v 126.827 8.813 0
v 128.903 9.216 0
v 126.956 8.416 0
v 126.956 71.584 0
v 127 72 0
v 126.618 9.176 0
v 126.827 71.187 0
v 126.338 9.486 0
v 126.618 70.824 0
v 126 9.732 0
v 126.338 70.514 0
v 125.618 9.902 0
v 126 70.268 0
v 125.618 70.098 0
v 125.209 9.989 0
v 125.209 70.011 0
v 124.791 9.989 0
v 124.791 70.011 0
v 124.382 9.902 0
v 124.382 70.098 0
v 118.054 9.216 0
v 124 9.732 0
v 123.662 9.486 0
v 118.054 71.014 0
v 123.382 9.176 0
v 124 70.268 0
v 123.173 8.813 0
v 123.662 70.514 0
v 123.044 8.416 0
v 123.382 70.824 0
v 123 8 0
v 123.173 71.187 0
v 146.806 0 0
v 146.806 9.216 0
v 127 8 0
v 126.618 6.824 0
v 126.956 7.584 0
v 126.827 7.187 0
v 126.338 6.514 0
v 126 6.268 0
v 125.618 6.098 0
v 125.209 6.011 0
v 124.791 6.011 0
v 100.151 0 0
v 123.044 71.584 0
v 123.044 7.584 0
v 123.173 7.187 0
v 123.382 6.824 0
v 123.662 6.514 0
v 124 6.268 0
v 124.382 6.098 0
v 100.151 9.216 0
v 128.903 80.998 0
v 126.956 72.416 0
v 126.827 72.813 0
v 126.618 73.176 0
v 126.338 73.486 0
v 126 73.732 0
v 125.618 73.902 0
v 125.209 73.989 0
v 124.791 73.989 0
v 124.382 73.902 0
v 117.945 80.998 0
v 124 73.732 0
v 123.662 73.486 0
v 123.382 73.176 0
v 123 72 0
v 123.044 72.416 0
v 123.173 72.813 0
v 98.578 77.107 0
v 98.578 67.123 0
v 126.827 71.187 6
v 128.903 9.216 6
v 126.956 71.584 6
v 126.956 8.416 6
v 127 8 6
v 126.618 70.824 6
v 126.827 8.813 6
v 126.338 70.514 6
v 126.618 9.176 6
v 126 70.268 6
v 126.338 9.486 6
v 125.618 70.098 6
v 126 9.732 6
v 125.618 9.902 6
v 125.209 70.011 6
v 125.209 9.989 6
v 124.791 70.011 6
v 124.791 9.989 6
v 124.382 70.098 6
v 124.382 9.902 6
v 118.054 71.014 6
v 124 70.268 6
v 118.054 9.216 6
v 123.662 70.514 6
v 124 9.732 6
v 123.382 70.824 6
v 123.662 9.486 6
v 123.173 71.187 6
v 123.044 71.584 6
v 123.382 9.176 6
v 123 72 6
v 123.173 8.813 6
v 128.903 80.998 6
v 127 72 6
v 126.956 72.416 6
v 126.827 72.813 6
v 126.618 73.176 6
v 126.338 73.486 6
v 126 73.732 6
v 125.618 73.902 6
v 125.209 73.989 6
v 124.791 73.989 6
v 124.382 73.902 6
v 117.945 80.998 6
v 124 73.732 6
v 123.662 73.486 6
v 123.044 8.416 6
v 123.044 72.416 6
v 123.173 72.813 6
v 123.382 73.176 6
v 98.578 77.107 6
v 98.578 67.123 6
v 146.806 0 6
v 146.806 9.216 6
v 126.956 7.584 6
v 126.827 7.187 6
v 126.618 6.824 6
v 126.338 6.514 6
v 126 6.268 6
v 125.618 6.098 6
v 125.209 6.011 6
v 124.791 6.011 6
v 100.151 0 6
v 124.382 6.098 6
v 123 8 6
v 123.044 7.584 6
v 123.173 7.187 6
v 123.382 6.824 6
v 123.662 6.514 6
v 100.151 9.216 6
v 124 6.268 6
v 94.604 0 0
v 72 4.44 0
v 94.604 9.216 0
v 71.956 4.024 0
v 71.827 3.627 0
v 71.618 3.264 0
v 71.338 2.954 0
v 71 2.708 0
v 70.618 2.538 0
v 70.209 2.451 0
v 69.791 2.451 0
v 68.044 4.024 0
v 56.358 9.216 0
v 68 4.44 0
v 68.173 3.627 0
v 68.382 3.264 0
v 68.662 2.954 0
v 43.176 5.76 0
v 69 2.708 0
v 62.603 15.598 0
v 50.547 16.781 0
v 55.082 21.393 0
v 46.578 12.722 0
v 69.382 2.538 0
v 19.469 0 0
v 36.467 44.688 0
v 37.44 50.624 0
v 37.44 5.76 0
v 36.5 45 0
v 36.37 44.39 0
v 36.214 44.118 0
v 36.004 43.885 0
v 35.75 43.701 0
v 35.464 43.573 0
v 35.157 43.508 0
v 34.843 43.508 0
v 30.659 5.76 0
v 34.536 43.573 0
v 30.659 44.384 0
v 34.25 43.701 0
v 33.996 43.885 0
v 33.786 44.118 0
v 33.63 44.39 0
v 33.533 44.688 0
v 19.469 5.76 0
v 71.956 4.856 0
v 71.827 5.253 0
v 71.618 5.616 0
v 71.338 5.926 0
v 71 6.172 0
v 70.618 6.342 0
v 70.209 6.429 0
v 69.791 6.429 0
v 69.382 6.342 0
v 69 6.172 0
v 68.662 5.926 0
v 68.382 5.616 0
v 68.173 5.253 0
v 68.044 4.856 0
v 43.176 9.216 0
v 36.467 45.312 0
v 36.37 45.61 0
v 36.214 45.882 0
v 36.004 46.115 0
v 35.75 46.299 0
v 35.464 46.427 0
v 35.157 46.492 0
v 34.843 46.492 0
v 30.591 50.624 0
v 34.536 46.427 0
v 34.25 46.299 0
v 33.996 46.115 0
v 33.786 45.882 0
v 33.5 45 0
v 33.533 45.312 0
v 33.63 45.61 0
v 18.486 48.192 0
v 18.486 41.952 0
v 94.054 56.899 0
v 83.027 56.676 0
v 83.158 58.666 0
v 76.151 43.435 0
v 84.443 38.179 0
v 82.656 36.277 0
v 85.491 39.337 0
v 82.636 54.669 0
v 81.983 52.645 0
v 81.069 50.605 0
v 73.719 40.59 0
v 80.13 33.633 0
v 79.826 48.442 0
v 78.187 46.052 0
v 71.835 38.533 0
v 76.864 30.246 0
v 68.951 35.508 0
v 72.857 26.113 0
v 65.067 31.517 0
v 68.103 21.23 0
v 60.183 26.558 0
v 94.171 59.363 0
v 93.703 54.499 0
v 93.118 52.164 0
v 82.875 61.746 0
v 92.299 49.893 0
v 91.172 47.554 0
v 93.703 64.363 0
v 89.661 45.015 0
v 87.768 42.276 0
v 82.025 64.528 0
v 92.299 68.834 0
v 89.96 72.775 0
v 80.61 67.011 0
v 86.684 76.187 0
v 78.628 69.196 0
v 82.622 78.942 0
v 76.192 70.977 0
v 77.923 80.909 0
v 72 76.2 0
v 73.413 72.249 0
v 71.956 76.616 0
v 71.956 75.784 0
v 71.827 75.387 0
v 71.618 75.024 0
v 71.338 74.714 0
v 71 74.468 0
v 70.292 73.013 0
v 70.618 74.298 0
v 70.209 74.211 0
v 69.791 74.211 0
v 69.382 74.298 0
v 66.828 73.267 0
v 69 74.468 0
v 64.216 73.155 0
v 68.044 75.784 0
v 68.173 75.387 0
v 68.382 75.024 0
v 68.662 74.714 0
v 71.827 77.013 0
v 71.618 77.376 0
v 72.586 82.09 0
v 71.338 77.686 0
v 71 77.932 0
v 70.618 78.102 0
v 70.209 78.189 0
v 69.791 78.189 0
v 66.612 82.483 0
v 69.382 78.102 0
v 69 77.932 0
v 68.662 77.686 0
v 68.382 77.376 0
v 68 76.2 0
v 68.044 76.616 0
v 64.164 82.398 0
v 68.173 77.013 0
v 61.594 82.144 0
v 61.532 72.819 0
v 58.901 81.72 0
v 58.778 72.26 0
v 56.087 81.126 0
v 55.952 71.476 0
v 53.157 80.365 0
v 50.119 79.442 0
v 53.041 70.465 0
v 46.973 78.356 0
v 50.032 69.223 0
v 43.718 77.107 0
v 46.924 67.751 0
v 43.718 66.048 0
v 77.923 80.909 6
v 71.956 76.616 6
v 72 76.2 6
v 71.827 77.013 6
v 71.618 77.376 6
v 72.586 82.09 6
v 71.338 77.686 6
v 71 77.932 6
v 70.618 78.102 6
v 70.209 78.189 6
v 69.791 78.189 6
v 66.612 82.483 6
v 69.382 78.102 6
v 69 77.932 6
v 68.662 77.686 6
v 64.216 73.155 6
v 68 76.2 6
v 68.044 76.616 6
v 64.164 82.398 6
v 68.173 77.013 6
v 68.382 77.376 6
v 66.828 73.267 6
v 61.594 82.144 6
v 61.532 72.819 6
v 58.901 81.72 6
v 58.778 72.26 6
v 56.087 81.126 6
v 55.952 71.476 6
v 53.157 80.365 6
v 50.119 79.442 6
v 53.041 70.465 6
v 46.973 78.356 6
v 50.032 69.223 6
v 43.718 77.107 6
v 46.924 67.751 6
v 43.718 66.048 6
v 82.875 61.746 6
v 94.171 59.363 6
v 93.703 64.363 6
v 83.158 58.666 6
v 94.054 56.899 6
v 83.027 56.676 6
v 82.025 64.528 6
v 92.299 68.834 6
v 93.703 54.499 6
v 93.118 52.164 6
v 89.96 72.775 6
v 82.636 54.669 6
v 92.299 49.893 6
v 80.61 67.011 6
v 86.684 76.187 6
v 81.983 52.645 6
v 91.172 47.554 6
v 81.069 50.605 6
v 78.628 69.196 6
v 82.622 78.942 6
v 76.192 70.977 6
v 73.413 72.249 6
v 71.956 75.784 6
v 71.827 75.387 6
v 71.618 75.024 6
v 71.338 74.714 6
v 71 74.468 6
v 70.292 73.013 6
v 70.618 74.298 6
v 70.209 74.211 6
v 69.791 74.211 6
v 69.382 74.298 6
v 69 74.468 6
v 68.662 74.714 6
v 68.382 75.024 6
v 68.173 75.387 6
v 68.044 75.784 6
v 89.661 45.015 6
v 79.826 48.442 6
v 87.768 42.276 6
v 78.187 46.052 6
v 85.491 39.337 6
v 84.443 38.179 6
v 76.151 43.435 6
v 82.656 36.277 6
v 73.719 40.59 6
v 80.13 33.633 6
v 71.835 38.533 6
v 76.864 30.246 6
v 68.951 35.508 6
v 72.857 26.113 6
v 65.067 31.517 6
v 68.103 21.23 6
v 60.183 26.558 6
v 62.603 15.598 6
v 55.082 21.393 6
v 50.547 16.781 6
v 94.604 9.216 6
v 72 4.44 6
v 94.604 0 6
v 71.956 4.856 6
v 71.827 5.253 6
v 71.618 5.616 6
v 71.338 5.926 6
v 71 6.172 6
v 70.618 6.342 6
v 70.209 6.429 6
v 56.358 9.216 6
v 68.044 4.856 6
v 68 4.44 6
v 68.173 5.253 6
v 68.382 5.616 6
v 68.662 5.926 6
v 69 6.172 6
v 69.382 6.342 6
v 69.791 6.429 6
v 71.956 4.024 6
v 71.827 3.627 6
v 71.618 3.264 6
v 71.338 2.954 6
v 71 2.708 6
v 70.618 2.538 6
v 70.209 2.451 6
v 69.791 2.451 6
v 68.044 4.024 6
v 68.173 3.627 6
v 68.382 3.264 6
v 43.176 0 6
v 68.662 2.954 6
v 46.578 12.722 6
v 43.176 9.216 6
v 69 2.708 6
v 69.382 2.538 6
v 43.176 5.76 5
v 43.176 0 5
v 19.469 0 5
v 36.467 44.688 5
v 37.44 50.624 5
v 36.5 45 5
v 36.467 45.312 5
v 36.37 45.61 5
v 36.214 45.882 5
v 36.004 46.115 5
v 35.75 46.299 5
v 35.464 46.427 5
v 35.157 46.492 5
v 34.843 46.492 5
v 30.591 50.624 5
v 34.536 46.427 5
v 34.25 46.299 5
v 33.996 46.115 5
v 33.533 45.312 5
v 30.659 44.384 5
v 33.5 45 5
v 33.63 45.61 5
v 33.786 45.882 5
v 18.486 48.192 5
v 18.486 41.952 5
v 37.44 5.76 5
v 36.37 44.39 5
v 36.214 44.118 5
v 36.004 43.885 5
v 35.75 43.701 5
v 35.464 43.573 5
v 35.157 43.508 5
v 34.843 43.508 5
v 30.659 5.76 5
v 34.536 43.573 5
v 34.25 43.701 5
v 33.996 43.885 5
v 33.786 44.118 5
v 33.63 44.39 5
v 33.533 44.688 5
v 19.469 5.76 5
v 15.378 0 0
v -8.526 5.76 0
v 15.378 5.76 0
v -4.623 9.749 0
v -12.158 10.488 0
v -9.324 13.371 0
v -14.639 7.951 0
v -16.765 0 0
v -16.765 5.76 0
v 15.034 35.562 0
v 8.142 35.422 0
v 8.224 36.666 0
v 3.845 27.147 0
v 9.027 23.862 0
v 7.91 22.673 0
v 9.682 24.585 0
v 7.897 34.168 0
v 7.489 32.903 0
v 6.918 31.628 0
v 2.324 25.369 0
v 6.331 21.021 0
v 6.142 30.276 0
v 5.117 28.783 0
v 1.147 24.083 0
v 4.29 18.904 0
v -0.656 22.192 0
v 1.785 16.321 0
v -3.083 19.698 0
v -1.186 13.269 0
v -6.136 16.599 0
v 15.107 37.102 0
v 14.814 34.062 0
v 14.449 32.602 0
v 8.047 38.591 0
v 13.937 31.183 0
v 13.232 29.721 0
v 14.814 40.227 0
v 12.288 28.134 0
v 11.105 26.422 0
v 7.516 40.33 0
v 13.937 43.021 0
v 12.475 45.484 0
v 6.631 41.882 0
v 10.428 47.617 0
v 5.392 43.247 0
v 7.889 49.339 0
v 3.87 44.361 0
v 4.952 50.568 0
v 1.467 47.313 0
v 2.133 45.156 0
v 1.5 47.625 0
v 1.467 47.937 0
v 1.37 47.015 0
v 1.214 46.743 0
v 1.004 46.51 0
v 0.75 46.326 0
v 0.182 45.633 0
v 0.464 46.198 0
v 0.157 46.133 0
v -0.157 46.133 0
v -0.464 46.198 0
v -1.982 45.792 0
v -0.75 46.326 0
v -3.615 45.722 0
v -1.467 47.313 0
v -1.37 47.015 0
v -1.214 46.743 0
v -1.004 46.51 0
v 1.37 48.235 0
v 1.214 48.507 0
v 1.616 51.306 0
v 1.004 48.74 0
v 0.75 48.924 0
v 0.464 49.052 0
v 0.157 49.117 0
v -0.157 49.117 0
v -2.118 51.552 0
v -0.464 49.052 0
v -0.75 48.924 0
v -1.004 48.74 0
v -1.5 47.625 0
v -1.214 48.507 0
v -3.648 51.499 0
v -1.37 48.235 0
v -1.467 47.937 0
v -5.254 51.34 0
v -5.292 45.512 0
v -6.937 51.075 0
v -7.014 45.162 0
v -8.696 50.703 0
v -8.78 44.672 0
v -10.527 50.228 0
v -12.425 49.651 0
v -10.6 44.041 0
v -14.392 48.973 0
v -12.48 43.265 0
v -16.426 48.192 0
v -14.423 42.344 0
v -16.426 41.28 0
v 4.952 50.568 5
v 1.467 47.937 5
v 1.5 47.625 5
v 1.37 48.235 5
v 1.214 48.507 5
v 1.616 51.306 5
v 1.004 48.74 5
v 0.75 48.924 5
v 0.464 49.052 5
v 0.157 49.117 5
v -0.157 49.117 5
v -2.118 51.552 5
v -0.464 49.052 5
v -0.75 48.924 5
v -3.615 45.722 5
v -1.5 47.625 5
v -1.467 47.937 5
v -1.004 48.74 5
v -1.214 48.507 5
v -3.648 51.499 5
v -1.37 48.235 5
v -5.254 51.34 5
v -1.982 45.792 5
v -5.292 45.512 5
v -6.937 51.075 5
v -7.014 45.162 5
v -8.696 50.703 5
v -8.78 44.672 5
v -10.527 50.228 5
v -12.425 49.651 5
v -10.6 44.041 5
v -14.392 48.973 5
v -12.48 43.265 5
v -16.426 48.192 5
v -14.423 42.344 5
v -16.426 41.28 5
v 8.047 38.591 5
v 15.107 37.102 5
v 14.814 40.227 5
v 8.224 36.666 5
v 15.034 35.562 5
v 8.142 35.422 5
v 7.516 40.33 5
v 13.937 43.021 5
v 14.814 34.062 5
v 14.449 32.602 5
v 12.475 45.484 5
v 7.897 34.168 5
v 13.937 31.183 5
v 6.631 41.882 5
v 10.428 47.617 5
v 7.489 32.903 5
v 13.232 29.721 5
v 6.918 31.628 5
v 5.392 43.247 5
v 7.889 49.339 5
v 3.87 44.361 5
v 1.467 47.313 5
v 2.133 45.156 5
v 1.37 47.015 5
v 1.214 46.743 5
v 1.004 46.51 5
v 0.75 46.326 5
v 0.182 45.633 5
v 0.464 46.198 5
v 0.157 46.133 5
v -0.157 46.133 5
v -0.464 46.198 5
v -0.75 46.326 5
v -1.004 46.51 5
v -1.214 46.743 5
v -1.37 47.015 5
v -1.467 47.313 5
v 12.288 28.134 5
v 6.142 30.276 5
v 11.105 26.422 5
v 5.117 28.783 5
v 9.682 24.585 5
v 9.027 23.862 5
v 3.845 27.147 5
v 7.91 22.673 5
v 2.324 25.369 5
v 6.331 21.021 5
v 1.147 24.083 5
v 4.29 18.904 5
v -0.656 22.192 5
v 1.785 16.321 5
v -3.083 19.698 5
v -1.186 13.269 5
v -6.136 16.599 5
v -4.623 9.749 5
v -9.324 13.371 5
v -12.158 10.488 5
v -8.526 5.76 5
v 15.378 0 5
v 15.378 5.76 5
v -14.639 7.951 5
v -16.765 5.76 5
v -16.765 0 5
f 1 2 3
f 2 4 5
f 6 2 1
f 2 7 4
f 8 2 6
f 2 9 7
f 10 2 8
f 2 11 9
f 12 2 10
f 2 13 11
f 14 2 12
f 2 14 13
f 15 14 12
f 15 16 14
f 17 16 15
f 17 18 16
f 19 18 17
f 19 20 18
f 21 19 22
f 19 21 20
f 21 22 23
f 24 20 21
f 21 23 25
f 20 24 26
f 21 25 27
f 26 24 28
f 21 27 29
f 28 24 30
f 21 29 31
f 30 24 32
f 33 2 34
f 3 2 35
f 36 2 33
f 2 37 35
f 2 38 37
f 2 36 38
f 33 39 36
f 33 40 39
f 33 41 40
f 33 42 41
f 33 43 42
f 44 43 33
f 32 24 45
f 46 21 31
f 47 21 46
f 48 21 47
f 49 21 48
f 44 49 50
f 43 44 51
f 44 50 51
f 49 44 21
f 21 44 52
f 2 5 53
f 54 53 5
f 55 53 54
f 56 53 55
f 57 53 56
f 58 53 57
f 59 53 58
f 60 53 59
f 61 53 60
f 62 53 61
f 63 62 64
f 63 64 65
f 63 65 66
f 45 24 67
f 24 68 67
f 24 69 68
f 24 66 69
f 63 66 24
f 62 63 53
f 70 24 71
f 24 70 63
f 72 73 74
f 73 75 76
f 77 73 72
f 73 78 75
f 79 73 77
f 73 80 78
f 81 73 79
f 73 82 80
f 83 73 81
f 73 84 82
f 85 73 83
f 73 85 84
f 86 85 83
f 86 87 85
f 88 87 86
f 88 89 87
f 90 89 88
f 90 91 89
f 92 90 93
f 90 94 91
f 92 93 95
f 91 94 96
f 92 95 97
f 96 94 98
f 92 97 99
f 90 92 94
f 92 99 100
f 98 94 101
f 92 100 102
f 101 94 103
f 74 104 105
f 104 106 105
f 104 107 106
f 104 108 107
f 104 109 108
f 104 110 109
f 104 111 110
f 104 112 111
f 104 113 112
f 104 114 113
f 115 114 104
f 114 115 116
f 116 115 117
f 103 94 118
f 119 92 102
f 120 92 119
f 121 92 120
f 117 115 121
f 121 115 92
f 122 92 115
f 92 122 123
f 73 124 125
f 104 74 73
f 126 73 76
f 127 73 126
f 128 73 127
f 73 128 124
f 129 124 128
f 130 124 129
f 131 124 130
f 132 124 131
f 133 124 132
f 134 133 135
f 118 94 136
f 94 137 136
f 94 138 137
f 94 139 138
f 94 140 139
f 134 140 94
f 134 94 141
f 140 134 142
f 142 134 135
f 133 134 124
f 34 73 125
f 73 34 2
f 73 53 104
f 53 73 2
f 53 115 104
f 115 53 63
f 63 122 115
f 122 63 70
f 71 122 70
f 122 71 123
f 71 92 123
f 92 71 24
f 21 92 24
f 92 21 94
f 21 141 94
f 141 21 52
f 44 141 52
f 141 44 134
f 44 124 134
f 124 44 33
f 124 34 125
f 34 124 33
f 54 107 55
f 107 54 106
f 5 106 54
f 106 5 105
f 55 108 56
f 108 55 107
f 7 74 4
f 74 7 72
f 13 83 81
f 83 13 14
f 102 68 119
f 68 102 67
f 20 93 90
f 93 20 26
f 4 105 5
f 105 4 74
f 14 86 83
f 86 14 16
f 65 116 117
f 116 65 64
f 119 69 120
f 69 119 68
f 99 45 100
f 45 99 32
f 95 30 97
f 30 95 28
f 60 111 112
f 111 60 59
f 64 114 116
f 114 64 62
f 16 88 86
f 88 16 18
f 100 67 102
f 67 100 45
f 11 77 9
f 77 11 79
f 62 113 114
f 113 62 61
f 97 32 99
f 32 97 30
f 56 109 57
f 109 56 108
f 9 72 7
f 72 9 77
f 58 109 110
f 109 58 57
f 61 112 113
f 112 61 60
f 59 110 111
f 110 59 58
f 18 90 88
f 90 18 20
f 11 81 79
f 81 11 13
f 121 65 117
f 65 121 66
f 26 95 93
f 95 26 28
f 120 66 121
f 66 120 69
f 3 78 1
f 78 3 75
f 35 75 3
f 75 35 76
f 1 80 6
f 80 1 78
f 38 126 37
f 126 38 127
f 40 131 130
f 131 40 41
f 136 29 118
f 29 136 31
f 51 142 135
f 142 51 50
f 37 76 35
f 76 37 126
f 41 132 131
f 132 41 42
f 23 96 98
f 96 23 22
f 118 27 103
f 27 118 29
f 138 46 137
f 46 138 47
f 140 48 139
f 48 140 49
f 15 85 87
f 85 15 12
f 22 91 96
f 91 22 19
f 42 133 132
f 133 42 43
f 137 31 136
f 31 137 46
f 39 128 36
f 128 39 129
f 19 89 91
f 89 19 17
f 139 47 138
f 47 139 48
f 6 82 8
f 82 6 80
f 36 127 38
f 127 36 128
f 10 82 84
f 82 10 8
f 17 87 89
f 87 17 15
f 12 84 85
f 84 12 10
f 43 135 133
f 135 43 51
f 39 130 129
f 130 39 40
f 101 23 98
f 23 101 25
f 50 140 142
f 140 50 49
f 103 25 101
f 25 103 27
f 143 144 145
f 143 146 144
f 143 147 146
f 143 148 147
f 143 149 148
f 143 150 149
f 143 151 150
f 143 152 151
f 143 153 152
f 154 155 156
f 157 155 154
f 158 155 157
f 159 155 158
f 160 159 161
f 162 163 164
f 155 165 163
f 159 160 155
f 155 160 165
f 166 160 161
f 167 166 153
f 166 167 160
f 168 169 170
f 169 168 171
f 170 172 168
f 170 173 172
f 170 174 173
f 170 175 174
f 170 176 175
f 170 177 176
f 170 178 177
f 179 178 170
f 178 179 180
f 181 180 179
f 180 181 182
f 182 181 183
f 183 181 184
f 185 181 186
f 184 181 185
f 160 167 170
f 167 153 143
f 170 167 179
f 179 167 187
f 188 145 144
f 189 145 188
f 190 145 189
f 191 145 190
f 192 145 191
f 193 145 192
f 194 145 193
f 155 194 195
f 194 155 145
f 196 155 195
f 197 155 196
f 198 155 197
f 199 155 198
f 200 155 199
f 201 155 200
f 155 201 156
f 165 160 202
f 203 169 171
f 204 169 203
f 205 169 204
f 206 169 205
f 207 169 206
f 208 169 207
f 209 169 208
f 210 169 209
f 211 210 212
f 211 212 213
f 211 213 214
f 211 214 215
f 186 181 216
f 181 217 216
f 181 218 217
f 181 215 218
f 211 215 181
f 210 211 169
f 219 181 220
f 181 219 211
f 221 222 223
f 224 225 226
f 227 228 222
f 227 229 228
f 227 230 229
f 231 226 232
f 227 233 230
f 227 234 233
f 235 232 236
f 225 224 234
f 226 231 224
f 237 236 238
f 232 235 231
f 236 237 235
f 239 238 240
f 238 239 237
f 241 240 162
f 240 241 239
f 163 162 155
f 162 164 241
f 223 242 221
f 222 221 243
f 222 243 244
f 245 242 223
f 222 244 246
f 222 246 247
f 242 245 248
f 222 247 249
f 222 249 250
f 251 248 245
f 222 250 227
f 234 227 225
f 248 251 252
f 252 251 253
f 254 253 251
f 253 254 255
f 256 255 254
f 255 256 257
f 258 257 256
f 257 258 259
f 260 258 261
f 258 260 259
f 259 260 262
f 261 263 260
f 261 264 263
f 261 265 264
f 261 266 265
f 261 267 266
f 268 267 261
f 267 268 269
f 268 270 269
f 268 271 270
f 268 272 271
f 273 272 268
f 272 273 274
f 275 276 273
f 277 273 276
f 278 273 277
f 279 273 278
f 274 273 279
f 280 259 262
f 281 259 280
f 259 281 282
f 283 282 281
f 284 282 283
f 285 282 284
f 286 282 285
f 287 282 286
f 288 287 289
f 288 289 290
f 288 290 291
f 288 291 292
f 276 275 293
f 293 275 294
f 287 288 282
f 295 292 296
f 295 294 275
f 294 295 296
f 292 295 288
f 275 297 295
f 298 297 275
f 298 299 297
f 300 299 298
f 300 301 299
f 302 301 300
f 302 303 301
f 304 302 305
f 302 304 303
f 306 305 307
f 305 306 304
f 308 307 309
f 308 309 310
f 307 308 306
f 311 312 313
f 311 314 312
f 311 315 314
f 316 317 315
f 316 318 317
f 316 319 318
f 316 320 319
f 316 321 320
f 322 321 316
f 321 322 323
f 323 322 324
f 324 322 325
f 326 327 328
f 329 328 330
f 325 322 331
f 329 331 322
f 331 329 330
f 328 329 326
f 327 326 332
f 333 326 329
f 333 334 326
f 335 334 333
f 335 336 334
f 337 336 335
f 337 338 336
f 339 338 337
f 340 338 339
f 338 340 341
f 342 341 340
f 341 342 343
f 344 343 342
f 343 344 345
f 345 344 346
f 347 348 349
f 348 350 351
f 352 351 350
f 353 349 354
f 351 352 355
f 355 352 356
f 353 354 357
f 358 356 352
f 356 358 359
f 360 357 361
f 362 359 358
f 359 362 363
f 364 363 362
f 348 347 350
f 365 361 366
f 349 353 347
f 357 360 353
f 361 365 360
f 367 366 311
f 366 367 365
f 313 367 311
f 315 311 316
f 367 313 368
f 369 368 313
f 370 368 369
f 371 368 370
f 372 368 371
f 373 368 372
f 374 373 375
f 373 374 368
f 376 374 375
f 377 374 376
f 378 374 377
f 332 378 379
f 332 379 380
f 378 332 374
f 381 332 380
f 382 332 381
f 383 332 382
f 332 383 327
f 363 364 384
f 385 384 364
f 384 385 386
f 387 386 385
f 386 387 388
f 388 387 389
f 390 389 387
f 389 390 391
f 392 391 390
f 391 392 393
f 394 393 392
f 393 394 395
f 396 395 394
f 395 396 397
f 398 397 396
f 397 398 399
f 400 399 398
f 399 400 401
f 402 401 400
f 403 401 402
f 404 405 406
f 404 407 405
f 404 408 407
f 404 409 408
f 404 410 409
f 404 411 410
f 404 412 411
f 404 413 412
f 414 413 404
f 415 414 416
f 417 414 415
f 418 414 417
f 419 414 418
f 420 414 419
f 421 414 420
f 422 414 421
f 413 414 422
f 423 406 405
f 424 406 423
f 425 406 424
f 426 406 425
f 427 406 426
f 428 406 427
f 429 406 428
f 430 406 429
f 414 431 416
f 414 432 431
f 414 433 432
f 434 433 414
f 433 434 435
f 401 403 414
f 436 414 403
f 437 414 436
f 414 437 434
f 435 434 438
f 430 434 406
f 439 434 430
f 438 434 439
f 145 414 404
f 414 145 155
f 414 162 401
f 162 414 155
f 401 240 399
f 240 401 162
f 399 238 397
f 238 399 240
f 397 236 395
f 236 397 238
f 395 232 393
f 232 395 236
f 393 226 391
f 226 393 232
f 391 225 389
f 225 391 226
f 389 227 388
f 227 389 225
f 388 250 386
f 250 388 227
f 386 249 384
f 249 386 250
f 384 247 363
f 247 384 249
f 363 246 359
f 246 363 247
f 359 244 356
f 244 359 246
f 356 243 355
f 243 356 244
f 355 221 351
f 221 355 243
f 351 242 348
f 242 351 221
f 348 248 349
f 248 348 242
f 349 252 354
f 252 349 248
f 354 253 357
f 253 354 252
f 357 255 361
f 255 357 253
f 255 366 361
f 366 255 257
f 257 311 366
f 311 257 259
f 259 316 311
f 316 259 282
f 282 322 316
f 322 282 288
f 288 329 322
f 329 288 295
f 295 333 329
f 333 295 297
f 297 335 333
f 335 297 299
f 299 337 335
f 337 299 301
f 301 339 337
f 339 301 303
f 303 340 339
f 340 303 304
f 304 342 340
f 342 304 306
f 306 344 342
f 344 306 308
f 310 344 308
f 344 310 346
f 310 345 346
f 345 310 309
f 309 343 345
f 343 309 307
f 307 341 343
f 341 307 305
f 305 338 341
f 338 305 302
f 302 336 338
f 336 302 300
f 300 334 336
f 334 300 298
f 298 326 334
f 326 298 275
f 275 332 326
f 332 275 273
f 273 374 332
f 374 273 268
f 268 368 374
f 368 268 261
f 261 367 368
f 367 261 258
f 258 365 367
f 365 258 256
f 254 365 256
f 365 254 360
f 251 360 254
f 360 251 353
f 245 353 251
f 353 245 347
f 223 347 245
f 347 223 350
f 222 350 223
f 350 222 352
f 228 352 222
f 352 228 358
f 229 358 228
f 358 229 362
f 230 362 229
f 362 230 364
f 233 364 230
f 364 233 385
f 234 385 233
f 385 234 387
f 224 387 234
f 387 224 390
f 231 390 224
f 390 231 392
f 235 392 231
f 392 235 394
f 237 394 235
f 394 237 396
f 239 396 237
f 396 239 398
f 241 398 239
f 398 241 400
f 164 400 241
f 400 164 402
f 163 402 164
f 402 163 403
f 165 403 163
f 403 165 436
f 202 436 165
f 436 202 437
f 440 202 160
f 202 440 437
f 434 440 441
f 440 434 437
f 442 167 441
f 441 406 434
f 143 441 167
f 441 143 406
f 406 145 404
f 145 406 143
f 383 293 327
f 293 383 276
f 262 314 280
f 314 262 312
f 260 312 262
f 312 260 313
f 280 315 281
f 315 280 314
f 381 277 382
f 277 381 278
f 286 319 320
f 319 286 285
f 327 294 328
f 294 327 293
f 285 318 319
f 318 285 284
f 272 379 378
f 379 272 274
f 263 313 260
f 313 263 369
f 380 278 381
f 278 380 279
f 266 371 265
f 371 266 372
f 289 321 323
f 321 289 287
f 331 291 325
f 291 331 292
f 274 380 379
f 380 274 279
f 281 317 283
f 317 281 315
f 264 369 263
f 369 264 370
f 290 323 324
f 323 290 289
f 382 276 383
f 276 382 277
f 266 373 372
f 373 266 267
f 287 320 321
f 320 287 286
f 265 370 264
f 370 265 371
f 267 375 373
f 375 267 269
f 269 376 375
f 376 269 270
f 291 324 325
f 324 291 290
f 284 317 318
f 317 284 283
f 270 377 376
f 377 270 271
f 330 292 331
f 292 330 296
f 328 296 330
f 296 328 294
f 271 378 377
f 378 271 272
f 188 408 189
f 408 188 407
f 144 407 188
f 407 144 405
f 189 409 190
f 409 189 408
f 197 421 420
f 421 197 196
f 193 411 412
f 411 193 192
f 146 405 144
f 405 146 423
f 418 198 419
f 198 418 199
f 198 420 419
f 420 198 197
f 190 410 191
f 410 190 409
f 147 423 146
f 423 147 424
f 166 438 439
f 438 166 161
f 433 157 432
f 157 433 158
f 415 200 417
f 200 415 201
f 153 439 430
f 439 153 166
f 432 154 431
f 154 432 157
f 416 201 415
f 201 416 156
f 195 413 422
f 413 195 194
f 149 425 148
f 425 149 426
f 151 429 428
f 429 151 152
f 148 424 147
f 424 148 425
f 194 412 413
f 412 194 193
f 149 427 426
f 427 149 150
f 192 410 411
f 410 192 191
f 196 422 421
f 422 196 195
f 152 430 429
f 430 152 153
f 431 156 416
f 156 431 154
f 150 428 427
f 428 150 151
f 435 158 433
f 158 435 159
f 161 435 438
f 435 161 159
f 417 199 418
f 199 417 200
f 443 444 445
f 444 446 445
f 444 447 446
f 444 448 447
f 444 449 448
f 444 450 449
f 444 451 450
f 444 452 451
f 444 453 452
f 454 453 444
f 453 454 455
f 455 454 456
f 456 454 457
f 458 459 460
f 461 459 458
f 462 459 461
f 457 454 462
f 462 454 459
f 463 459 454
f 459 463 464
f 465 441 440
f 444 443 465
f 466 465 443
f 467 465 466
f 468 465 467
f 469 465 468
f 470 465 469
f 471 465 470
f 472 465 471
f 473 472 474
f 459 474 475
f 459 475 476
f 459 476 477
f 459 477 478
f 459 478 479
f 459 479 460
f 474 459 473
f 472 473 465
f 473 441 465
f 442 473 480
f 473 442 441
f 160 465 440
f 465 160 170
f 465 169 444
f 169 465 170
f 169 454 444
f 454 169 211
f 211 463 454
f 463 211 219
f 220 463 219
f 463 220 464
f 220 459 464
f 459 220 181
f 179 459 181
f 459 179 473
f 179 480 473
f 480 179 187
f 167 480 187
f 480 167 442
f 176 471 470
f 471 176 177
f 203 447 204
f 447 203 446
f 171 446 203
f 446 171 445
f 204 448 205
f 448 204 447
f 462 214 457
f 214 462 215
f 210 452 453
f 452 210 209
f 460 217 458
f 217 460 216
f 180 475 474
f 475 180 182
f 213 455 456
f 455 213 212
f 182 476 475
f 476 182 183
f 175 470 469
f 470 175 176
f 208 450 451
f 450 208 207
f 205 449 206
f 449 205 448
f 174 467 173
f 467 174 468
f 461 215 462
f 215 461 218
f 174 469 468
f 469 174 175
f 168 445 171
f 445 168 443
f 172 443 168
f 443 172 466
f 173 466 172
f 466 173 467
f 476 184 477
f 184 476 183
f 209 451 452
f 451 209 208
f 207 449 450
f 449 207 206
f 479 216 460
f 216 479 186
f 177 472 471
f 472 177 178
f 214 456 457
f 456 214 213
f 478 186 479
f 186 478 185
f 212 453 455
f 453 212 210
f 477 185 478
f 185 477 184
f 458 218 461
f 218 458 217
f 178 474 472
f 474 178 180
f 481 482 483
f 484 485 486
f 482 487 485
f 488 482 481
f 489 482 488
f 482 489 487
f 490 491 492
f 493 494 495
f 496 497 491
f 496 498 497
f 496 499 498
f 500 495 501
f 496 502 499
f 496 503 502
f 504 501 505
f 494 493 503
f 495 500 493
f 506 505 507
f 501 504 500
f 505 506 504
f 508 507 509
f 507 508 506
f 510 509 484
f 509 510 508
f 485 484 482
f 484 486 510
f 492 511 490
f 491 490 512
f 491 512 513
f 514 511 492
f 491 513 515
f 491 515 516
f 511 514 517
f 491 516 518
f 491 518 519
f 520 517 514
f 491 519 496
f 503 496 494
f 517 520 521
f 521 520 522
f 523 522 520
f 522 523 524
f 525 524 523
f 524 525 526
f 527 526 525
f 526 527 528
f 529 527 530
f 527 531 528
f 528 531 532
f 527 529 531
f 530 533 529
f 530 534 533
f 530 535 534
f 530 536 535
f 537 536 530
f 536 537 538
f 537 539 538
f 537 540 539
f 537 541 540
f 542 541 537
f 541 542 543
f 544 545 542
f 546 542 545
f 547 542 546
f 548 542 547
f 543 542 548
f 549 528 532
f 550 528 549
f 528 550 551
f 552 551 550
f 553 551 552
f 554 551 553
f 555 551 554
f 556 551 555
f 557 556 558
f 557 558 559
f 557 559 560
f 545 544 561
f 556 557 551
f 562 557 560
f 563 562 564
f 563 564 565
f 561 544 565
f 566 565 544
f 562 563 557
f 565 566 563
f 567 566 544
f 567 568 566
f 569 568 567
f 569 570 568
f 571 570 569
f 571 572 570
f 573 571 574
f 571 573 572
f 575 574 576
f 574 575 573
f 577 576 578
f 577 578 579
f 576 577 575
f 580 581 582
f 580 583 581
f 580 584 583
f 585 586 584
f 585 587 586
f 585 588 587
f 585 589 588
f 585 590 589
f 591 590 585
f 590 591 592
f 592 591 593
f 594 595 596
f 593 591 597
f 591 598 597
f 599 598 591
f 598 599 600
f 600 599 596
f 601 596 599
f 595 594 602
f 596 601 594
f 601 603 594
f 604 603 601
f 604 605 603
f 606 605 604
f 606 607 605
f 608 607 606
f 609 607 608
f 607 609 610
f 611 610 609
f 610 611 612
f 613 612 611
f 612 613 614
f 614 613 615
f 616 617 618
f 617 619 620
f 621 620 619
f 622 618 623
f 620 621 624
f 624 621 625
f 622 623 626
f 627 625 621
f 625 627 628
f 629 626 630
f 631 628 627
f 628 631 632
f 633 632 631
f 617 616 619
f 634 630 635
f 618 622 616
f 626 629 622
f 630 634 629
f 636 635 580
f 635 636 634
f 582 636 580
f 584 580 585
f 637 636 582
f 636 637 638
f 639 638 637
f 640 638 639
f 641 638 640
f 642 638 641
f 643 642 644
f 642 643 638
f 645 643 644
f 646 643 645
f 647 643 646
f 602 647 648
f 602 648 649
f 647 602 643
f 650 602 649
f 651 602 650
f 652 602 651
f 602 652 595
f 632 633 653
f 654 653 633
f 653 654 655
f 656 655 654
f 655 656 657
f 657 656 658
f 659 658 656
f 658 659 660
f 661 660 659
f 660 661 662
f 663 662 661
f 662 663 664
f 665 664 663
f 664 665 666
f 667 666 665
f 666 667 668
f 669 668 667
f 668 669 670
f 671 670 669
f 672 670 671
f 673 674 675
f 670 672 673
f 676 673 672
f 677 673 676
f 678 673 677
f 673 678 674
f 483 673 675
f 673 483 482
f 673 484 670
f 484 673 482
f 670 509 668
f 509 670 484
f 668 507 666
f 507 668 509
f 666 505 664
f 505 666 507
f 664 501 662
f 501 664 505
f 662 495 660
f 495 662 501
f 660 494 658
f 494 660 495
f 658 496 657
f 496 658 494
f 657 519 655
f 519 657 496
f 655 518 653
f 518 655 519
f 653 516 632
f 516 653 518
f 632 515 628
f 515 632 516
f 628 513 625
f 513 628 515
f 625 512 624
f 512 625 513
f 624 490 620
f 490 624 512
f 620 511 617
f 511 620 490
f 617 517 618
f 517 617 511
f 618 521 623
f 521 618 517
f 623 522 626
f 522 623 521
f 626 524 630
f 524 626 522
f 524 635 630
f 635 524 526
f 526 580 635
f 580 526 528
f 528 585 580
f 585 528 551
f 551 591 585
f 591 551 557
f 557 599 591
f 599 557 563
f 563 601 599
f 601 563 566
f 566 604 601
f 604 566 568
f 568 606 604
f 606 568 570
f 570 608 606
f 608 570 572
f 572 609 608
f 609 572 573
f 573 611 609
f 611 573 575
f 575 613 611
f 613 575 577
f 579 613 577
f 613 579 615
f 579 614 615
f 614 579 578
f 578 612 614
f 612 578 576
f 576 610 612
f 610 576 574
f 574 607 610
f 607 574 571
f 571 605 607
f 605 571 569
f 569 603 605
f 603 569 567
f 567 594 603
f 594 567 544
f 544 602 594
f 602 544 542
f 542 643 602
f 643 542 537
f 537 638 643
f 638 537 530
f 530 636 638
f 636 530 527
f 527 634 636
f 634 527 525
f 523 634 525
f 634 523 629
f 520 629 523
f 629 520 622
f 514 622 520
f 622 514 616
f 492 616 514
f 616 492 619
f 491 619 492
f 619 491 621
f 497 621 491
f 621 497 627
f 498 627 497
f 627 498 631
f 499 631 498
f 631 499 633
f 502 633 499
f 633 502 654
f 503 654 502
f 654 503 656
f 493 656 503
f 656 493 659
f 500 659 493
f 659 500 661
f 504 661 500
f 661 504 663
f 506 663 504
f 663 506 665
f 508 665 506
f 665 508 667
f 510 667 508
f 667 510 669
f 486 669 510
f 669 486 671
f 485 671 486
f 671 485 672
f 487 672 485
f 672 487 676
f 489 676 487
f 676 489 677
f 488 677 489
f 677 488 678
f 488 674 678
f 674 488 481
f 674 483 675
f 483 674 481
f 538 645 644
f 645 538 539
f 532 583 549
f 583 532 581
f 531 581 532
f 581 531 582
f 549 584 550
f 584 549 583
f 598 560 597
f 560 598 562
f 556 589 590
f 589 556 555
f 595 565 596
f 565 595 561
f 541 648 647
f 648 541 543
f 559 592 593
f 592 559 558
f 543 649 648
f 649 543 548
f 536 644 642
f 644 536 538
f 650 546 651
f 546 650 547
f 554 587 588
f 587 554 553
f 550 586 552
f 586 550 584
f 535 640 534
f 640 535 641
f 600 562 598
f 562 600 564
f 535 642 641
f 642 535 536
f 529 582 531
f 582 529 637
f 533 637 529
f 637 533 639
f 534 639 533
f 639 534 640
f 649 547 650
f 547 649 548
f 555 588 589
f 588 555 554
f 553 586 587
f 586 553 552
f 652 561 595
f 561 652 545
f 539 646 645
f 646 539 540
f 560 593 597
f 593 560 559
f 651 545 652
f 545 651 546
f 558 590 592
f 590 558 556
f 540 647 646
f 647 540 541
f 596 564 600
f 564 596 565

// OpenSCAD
// Some simple letters for the exit gate

$fn=30;

hole_diameter = 4;
hole_diameter_key = 3;


module sign_one(size, thickness) {
    difference() {
        // Adjust to center - try and keep size dependant.
        linear_extrude(thickness)
        translate([size/90.0-size/16.0,0,0])
        text("1", size=size, font = "Droid Sans", halign="center");

        // Substract two holes.
        translate([0,size*0.9,0])
        cylinder(r = hole_diameter / 2.0, h=thickness*2, center = true );
        // Substract two holes.
        translate([0,size*0.1,0])
        cylinder(r = hole_diameter / 2.0, h=thickness*2, center = true );

    }
}

module sign_two(size, thickness) {
    difference() {
        // Adjust to center - try and keep size dependant.
        linear_extrude(thickness)
        translate([size/90.0-size/60.0,0,0])
        text("2", size=size, font = "Droid Sans", halign="center");

        // Substract two holes.
        translate([0,size*0.9525,0])
        cylinder(r = hole_diameter / 2.0, h=thickness*2, center = true );
        // Substract two holes.
        translate([0,size*0.0555,0])
        cylinder(r = hole_diameter / 2.0, h=thickness*2, center = true );

    }
}
module key_one(size, thickness) {
    difference() {
        // Adjust to center - try and keep size dependant.
        linear_extrude(thickness)
        translate([size/90.0-size/16.0,0,0])
        text("1", size=size, font = "Droid Sans", halign="center");

        // Substract a hole.
        translate([0,size*0.9,0])
        cylinder(r = hole_diameter_key / 2.0, h=thickness*2, center = true );
    }
}

module key_two(size, thickness) {
    difference() {
        // Adjust to center - try and keep size dependant.
        linear_extrude(thickness)
        translate([size/90.0-size/60.0,0,0])
        text("2", size=size, font = "Droid Sans", halign="center");

        // Substract a hole.
        translate([0,size*0.9525,0])
        cylinder(r = hole_diameter_key / 2.0, h=thickness*2, center = true );
    }
}

translate([35,0,0]) {
    translate([35,0,0]) {
        translate([55,0,0])
        sign_one(80, 6);
        sign_two(80,6);
    }
    key_one(50,5);
}
key_two(50,5);
